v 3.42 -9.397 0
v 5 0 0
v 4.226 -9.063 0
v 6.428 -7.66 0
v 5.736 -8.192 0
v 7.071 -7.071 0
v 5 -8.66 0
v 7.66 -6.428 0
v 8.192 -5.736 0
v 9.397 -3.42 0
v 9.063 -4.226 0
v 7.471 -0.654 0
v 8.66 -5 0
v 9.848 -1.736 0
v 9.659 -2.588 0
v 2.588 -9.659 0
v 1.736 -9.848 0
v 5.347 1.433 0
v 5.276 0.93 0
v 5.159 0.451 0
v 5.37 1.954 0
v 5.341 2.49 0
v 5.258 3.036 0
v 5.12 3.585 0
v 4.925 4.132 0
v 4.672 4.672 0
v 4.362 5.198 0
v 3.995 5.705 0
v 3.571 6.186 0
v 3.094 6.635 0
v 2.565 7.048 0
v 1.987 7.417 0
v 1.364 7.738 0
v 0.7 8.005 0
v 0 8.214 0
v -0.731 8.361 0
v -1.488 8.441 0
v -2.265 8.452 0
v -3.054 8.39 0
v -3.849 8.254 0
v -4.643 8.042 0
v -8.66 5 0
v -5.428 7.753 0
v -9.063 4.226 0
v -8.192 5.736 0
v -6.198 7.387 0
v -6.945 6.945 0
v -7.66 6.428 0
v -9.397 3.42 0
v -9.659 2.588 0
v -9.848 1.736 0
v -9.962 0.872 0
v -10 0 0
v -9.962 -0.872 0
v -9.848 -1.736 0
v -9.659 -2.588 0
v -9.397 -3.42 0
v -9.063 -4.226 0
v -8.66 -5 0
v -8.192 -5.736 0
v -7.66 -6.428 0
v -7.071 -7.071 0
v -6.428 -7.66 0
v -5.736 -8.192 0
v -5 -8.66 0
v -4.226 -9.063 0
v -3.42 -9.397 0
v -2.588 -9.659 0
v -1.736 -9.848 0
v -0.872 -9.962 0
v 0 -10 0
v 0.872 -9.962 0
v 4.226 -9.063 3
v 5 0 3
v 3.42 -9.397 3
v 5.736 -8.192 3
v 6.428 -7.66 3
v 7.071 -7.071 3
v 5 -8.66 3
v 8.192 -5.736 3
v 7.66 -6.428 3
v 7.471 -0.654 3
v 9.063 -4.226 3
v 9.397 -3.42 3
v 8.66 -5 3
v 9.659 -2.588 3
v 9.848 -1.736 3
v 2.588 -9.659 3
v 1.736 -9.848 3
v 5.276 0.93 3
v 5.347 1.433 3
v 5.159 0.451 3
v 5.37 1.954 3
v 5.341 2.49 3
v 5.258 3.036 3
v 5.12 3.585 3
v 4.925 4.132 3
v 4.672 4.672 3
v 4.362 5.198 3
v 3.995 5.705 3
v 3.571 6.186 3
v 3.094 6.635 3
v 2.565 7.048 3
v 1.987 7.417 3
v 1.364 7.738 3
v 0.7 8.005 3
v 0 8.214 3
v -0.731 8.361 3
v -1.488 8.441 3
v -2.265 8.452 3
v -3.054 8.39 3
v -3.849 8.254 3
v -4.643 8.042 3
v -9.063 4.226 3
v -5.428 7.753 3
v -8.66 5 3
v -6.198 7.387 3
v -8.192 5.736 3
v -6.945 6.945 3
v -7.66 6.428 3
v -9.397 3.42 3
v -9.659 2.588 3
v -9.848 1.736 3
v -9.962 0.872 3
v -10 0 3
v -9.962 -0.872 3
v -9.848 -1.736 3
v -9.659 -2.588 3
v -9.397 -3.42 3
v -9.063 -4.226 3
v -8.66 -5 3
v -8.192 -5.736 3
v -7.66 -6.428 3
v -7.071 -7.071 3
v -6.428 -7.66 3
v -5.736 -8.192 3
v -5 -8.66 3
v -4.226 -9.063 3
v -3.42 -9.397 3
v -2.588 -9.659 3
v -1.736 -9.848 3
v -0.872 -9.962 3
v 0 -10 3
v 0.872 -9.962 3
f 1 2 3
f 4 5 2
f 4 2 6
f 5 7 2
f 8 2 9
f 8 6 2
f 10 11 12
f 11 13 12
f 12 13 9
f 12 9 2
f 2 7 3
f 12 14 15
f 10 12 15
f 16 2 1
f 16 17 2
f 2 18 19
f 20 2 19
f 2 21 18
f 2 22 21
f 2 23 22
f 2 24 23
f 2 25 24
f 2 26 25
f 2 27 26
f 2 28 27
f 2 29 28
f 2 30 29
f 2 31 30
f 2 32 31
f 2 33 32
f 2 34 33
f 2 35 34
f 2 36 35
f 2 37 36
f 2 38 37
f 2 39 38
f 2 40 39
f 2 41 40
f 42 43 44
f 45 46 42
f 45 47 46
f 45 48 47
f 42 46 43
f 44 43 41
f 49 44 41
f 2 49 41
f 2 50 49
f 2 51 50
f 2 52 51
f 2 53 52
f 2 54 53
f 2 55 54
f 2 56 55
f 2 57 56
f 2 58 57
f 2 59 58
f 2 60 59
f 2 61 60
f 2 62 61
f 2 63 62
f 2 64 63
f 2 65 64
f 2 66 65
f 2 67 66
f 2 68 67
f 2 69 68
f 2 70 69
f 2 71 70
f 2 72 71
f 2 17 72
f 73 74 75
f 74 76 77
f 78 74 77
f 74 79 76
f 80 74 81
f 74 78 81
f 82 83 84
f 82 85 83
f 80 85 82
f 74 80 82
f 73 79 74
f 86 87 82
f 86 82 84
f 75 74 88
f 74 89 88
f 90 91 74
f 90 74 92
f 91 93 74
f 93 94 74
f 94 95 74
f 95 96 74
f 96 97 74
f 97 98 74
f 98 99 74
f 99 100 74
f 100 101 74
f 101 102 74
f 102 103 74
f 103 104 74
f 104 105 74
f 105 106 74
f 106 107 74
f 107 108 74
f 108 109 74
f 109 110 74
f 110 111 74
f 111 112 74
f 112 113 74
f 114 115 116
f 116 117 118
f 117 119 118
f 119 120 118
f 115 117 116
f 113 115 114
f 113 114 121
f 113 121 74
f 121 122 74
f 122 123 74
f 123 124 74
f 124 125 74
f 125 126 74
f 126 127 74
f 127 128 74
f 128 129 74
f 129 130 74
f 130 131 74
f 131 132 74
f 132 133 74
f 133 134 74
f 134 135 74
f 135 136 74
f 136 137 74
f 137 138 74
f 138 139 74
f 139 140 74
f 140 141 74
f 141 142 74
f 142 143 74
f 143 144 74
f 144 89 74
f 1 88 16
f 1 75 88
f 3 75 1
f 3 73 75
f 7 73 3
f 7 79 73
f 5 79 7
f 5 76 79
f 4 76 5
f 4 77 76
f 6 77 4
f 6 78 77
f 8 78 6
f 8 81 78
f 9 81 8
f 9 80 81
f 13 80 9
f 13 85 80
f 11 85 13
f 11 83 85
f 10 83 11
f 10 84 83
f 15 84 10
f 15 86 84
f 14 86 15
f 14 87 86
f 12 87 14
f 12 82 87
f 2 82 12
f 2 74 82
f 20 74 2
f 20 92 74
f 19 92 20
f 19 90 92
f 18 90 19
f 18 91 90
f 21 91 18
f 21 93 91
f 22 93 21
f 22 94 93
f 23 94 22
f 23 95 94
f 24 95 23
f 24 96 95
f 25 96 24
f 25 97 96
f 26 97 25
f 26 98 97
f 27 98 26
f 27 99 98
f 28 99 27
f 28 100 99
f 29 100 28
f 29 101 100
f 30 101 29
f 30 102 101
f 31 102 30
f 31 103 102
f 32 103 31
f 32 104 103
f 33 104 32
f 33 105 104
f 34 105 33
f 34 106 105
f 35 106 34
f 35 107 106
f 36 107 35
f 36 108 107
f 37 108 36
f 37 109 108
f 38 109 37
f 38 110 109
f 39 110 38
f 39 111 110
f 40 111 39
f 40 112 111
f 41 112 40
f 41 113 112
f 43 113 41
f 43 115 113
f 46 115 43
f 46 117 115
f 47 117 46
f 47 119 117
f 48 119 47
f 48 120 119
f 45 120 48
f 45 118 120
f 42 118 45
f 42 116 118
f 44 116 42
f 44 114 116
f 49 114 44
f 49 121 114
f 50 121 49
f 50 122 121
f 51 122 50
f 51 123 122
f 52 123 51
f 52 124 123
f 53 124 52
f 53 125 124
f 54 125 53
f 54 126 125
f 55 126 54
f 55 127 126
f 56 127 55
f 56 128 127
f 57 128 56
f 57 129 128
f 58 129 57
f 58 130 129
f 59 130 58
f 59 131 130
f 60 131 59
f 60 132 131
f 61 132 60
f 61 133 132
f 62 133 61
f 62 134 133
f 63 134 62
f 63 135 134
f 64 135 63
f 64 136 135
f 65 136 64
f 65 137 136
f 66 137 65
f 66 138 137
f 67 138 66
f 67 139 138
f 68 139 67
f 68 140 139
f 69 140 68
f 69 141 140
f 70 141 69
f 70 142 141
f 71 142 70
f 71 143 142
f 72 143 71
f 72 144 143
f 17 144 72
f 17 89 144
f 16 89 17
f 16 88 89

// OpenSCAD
function polar_to_xy(v) = [v[1] * cos(v[0]), v[1] * sin(v[0] )];

module polar_profile(control_points,step) {
/*
    control_points is an array of arrays, each of which defines a 
    point in polar cordinates [radius, angle] 
    the last angle must be the first angle + 360 for a complete profile
      e.g. [ [0,5], [130,9.9], [140,10], [350,10], [360,5] ]

    the result is a 2D profile interpolated at step degree intervals
    between these points

    by kit.wallace@gmail.com
*/
    for (angle =[0: step: 360 - 1])
         assign (ps = [angle,  lookup(angle, control_points)],
                 pe = [angle+step,  lookup(angle+step, control_points) ]
                )
         polygon ([ [0,0], polar_to_xy(ps), polar_to_xy(pe)]);
}

snail = [ [0,5], [140,10], [350,10], [360,5] ];
linear_extrude(height = 3) polar_profile(snail,5);
